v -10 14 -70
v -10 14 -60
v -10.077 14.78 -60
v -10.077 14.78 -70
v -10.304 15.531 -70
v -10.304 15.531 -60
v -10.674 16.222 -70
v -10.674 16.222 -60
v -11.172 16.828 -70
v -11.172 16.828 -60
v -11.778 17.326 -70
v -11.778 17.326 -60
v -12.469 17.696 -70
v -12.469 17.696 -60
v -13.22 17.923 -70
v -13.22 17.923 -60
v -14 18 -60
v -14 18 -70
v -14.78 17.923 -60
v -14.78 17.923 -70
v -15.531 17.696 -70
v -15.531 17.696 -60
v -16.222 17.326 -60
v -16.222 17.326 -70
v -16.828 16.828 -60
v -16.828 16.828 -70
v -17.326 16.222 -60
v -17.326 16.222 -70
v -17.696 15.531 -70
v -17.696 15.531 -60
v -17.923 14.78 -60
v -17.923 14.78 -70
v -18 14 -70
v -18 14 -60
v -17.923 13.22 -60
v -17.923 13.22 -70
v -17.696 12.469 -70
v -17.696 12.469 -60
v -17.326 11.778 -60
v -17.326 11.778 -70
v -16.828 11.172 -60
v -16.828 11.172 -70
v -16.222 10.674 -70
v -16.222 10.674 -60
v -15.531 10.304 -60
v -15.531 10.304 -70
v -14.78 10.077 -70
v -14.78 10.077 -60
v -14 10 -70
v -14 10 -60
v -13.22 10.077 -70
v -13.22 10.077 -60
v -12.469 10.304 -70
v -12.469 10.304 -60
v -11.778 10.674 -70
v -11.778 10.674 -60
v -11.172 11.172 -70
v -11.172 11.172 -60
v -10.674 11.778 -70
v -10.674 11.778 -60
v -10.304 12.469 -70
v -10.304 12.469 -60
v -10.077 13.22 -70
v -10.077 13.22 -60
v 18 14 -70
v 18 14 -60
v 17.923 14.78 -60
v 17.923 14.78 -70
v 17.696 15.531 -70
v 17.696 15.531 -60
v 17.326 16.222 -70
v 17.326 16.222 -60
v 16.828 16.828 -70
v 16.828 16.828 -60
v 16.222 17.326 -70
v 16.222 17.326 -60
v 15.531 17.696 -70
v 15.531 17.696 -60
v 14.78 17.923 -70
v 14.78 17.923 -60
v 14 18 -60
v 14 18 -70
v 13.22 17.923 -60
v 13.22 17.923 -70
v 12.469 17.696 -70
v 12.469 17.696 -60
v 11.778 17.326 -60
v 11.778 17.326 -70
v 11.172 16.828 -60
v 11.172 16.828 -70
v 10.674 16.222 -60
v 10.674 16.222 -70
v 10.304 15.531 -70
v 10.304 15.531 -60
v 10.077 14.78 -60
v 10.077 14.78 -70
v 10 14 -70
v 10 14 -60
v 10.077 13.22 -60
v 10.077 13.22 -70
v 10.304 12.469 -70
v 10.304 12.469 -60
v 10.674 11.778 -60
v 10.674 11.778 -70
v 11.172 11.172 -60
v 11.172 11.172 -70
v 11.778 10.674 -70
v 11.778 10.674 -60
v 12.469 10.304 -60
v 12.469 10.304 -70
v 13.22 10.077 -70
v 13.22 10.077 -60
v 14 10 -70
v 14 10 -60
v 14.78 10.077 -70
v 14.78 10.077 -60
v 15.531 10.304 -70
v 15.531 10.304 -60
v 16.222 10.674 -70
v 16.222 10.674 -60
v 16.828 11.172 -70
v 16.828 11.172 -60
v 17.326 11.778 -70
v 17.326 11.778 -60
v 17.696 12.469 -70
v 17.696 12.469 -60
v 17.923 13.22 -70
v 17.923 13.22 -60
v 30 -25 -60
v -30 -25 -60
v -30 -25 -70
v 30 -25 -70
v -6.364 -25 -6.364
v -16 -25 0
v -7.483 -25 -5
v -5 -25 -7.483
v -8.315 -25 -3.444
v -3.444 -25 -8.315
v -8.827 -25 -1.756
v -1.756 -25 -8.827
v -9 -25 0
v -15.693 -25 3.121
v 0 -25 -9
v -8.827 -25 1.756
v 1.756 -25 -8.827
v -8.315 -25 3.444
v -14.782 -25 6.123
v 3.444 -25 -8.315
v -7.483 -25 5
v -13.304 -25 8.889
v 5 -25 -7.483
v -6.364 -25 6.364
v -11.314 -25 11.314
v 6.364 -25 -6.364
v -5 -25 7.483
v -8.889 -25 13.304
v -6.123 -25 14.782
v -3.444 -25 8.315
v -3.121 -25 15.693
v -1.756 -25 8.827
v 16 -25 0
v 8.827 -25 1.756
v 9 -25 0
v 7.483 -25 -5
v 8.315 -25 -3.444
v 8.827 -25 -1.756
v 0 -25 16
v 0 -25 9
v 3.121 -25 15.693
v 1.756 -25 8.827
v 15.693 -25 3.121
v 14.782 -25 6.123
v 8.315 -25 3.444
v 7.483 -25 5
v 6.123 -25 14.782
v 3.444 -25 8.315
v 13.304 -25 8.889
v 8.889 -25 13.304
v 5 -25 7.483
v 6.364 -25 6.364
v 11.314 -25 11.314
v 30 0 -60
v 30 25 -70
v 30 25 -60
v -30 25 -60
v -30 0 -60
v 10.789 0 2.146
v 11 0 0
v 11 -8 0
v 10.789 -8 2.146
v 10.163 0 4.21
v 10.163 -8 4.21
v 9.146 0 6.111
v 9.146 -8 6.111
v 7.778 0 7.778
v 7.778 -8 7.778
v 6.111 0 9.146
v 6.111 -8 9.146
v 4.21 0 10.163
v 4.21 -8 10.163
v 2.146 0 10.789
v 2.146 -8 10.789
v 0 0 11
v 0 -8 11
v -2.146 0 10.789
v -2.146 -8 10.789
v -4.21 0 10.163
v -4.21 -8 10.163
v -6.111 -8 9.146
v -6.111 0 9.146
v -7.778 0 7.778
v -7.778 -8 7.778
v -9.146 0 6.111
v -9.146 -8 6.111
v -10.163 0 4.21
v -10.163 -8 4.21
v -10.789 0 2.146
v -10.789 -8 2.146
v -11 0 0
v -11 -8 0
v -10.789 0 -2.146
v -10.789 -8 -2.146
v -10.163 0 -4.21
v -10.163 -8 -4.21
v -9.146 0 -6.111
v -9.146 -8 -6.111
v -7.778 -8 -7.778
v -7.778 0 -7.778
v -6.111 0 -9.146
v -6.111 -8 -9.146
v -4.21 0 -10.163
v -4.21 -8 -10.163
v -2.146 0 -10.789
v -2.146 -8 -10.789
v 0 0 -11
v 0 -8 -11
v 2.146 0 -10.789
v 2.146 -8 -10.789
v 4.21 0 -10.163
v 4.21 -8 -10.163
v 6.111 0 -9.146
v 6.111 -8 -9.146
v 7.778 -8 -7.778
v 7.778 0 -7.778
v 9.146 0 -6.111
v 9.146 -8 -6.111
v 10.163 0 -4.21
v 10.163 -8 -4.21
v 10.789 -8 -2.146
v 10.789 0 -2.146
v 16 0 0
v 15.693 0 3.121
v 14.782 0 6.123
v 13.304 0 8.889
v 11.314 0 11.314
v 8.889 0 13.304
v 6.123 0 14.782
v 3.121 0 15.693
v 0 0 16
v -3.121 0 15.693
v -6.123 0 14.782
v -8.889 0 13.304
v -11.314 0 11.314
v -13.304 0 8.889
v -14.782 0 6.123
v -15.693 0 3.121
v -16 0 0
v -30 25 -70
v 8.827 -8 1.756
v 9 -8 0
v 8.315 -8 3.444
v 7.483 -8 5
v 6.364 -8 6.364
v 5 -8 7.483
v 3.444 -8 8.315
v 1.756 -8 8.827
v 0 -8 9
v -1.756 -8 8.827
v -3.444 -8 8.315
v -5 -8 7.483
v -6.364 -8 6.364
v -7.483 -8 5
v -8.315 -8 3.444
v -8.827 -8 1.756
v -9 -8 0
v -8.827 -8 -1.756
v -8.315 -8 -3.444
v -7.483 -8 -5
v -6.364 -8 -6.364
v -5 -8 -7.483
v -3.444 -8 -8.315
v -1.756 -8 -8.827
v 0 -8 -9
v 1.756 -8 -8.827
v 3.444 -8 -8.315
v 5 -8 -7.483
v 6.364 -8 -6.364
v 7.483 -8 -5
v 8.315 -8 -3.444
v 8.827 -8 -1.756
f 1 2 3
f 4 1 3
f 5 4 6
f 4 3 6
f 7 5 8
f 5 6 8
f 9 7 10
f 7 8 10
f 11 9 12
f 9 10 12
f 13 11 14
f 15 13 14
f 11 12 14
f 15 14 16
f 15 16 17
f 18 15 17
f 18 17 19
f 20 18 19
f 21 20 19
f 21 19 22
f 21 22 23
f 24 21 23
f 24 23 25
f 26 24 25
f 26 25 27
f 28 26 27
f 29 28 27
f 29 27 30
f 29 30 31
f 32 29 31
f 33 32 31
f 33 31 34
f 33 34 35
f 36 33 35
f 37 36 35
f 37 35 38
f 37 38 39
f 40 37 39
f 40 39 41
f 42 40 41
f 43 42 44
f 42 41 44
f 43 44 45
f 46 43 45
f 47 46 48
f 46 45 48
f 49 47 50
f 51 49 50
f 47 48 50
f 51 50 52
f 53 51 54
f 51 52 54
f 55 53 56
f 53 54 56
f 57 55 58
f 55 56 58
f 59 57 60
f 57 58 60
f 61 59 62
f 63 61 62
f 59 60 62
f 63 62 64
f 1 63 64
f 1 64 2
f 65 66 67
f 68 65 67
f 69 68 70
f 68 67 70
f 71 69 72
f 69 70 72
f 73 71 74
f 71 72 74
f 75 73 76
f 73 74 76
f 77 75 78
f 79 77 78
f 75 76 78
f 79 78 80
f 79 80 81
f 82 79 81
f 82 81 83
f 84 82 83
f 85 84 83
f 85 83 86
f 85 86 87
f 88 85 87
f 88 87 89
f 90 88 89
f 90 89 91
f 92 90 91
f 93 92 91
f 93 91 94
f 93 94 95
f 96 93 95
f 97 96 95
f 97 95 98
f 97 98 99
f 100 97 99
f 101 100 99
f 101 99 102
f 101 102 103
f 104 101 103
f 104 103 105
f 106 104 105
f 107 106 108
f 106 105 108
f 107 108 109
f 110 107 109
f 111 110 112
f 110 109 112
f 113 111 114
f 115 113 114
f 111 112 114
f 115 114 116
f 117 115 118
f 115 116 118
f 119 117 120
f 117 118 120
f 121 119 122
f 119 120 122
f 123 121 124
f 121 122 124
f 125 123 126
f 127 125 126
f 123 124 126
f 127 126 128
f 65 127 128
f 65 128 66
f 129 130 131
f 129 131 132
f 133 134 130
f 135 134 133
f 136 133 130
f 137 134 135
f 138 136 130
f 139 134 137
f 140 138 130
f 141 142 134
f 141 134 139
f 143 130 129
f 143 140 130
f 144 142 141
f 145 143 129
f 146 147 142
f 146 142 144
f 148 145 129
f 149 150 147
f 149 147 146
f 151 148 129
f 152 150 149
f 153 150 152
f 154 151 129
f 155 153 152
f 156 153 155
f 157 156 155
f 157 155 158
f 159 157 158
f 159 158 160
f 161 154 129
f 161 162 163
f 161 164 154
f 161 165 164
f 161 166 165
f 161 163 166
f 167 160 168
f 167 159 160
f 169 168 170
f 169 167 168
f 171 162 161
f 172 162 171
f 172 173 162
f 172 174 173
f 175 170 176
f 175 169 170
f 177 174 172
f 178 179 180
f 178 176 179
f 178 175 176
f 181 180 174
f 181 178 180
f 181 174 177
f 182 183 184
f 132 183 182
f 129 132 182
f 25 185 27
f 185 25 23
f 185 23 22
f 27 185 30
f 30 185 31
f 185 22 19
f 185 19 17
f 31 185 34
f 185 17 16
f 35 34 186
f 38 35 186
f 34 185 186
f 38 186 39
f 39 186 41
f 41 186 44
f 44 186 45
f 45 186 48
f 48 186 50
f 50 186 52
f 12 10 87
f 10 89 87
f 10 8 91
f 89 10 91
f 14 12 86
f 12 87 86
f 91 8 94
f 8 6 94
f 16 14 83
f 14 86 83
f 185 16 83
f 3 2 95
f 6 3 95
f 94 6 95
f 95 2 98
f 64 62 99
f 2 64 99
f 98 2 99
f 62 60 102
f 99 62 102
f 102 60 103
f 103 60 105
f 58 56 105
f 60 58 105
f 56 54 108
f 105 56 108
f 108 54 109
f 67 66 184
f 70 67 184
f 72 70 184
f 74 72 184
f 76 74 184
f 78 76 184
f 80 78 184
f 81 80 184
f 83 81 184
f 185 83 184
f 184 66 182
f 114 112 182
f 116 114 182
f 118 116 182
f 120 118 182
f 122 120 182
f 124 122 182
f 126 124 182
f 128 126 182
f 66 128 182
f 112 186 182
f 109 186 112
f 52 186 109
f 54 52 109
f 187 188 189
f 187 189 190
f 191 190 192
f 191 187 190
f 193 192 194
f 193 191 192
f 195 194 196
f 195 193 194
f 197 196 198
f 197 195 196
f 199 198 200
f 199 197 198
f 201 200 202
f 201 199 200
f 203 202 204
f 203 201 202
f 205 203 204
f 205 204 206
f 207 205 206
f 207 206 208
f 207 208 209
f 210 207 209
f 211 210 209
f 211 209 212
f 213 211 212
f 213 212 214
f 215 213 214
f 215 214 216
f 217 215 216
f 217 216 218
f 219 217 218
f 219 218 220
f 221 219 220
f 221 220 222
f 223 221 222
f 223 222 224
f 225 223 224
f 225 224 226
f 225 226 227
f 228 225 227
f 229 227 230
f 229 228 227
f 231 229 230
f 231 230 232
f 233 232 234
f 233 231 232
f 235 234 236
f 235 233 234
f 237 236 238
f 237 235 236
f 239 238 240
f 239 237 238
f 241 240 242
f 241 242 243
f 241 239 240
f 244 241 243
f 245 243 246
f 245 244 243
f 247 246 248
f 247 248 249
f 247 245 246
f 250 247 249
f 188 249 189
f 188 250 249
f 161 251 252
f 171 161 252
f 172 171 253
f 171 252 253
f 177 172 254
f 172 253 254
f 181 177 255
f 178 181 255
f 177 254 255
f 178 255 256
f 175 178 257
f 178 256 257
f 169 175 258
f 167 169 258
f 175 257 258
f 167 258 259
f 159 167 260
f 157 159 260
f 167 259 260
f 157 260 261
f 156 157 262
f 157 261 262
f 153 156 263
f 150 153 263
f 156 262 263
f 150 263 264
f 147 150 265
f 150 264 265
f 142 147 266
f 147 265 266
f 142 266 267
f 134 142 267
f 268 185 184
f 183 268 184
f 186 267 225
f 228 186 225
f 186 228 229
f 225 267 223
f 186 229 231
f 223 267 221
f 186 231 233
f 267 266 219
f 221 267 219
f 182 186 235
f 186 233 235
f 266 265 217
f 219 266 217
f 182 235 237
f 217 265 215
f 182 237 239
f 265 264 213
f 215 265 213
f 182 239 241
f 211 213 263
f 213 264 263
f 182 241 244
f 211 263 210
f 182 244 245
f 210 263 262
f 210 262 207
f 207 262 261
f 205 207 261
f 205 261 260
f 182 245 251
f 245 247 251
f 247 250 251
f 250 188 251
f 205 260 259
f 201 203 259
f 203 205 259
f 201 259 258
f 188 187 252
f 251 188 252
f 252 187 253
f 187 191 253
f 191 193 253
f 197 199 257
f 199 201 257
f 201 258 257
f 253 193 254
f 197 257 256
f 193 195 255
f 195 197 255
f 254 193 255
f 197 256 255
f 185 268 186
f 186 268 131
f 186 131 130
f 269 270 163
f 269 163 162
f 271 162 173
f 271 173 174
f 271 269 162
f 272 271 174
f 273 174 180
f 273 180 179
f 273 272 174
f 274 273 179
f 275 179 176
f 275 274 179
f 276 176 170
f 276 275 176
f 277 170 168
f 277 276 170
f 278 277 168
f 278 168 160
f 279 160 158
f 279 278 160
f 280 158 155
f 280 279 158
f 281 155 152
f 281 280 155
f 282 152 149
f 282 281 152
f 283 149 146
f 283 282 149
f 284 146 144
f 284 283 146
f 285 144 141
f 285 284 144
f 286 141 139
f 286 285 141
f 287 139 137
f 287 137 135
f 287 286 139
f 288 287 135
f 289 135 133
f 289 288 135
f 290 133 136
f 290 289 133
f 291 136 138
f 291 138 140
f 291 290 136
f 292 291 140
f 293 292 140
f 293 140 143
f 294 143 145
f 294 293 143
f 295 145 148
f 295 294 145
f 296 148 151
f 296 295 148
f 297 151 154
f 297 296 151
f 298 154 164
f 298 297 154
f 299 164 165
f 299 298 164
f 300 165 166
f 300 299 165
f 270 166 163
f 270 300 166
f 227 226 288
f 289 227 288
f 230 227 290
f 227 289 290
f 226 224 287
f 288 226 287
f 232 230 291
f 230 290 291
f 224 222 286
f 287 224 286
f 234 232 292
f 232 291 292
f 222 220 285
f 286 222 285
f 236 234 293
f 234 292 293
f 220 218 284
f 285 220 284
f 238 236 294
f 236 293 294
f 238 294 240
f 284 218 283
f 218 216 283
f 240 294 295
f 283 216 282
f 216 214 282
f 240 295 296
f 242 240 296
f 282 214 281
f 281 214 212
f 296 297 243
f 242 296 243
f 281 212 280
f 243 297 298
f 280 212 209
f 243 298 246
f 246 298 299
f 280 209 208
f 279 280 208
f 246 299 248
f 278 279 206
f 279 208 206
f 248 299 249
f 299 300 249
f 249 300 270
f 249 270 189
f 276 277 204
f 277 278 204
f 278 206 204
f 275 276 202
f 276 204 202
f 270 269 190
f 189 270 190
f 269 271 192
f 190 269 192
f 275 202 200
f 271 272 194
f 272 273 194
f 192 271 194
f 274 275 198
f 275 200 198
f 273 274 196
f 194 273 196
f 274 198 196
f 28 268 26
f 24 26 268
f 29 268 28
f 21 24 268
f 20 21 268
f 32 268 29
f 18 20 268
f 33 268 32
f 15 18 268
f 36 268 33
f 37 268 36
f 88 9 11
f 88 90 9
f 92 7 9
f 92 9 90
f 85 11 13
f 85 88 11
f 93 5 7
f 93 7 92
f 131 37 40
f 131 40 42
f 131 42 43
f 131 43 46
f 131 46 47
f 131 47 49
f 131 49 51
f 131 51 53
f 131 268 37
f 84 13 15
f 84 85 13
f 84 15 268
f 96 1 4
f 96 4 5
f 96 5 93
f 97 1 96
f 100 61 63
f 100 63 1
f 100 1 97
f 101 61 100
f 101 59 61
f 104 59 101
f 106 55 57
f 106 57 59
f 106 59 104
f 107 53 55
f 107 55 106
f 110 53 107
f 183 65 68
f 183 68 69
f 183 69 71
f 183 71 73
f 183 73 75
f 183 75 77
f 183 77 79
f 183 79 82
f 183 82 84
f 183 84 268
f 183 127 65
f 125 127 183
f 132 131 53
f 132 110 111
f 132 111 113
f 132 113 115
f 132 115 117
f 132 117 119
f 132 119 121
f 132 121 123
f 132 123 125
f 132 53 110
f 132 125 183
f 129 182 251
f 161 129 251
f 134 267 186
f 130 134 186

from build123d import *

# Parameters (mm, degrees)
F0_R     = 11
F0_W     = 60
F0_H     = 10
F1_DEPTH = 25
F2_DEPTH = 25
F3_START = 8
F0_R_2   = 9
F3_DEPTH = 17
F4_R     = 4
F5_DEPTH = 25


with BuildPart() as f1:
    # F0 (on Front) → F1 (new body)
    with BuildSketch(Plane.XZ):
        with BuildLine():
            ThreePointArc((16, 0), (0, 16), (-16, 0))
            Line((-16, 0), (-30, -60))
            Line((-30, -60), (30, -60))
            Line((30, -60), (16, 0))
        make_face()
        Circle(F0_R, mode=Mode.SUBTRACT)
        with Locations((0, -65)):
            Rectangle(F0_W, F0_H)
    extrude(amount=F1_DEPTH)

    # F0 (on Front) → F2 (join)
    with BuildSketch(Plane.XZ):
        with Locations((0, -65)):
            Rectangle(F0_W, F0_H)
    extrude(amount=-F2_DEPTH)

    # F0 (on Front) → F3 (join)
    with BuildSketch(Plane.XZ.offset(F3_START)):
        Circle(F0_R)
        Circle(F0_R_2, mode=Mode.SUBTRACT)
    extrude(amount=F3_DEPTH)

    # F4 (on face) → F5 (cut)
    with BuildSketch(Plane.XY.offset(-60)):
        with Locations((-14, 14)):
            Circle(F4_R)
        with Locations((14, 14)):
            Circle(F4_R)
    extrude(amount=-F5_DEPTH, mode=Mode.SUBTRACT)


solid = f1.part
